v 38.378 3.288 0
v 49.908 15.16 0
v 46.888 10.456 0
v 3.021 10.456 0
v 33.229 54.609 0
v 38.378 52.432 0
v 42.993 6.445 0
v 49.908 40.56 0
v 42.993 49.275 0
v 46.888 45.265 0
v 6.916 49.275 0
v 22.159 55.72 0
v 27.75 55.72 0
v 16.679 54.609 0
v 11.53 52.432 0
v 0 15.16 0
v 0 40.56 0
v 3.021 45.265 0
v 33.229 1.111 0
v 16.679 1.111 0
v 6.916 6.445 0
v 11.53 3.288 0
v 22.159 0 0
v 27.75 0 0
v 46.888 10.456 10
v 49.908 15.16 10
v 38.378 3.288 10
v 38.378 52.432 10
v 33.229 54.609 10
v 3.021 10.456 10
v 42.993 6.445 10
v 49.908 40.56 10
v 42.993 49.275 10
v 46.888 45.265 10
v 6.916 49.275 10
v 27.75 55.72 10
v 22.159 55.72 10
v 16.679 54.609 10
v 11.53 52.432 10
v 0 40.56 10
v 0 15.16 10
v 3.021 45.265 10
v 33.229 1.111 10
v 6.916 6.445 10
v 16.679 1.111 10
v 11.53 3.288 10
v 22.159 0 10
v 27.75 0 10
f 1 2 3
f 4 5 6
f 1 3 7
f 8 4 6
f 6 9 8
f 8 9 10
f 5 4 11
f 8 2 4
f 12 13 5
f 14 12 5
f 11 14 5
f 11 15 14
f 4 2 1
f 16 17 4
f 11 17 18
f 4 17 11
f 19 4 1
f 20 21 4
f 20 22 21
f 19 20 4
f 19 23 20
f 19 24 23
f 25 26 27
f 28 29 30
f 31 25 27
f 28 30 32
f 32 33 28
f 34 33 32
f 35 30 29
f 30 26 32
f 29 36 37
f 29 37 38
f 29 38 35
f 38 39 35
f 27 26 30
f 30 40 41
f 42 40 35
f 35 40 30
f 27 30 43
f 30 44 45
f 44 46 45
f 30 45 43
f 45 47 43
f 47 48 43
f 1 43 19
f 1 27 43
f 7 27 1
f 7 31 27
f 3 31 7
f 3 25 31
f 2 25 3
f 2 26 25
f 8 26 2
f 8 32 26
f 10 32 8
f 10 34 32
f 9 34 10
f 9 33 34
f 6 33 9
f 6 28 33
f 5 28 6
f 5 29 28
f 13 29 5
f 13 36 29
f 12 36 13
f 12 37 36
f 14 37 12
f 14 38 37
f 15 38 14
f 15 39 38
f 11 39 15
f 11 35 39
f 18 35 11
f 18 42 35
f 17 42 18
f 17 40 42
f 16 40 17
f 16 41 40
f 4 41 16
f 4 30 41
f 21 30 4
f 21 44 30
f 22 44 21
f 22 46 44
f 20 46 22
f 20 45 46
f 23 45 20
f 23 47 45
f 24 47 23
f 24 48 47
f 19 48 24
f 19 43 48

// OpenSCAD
$fn = 32;

// ----------------------------------------------------------------------
// Flat adaptor: double_d, 10 mm thick
// ----------------------------------------------------------------------

// --- parameters (mm) ---
profile_height = 10;      // extrusion height
profile_points = 24;      // points of the closed outline

profile = [[49.908, 40.56], [46.888, 45.265], [42.993, 49.275], [38.378, 52.432], [33.229, 54.609], [27.75, 55.72], [22.159, 55.72], [16.679, 54.609], [11.53, 52.432], [6.916, 49.275], [3.021, 45.265], [0, 40.56], [0, 15.16], [3.021, 10.456], [6.916, 6.445], [11.53, 3.288], [16.679, 1.111], [22.159, 0], [27.75, 0], [33.229, 1.111], [38.378, 3.288], [42.993, 6.445], [46.888, 10.456], [49.908, 15.16]];  // single closed polygon, 24 points, counter clockwise

// --- the one profile operation ---
linear_extrude(height = profile_height) polygon(points = profile);
